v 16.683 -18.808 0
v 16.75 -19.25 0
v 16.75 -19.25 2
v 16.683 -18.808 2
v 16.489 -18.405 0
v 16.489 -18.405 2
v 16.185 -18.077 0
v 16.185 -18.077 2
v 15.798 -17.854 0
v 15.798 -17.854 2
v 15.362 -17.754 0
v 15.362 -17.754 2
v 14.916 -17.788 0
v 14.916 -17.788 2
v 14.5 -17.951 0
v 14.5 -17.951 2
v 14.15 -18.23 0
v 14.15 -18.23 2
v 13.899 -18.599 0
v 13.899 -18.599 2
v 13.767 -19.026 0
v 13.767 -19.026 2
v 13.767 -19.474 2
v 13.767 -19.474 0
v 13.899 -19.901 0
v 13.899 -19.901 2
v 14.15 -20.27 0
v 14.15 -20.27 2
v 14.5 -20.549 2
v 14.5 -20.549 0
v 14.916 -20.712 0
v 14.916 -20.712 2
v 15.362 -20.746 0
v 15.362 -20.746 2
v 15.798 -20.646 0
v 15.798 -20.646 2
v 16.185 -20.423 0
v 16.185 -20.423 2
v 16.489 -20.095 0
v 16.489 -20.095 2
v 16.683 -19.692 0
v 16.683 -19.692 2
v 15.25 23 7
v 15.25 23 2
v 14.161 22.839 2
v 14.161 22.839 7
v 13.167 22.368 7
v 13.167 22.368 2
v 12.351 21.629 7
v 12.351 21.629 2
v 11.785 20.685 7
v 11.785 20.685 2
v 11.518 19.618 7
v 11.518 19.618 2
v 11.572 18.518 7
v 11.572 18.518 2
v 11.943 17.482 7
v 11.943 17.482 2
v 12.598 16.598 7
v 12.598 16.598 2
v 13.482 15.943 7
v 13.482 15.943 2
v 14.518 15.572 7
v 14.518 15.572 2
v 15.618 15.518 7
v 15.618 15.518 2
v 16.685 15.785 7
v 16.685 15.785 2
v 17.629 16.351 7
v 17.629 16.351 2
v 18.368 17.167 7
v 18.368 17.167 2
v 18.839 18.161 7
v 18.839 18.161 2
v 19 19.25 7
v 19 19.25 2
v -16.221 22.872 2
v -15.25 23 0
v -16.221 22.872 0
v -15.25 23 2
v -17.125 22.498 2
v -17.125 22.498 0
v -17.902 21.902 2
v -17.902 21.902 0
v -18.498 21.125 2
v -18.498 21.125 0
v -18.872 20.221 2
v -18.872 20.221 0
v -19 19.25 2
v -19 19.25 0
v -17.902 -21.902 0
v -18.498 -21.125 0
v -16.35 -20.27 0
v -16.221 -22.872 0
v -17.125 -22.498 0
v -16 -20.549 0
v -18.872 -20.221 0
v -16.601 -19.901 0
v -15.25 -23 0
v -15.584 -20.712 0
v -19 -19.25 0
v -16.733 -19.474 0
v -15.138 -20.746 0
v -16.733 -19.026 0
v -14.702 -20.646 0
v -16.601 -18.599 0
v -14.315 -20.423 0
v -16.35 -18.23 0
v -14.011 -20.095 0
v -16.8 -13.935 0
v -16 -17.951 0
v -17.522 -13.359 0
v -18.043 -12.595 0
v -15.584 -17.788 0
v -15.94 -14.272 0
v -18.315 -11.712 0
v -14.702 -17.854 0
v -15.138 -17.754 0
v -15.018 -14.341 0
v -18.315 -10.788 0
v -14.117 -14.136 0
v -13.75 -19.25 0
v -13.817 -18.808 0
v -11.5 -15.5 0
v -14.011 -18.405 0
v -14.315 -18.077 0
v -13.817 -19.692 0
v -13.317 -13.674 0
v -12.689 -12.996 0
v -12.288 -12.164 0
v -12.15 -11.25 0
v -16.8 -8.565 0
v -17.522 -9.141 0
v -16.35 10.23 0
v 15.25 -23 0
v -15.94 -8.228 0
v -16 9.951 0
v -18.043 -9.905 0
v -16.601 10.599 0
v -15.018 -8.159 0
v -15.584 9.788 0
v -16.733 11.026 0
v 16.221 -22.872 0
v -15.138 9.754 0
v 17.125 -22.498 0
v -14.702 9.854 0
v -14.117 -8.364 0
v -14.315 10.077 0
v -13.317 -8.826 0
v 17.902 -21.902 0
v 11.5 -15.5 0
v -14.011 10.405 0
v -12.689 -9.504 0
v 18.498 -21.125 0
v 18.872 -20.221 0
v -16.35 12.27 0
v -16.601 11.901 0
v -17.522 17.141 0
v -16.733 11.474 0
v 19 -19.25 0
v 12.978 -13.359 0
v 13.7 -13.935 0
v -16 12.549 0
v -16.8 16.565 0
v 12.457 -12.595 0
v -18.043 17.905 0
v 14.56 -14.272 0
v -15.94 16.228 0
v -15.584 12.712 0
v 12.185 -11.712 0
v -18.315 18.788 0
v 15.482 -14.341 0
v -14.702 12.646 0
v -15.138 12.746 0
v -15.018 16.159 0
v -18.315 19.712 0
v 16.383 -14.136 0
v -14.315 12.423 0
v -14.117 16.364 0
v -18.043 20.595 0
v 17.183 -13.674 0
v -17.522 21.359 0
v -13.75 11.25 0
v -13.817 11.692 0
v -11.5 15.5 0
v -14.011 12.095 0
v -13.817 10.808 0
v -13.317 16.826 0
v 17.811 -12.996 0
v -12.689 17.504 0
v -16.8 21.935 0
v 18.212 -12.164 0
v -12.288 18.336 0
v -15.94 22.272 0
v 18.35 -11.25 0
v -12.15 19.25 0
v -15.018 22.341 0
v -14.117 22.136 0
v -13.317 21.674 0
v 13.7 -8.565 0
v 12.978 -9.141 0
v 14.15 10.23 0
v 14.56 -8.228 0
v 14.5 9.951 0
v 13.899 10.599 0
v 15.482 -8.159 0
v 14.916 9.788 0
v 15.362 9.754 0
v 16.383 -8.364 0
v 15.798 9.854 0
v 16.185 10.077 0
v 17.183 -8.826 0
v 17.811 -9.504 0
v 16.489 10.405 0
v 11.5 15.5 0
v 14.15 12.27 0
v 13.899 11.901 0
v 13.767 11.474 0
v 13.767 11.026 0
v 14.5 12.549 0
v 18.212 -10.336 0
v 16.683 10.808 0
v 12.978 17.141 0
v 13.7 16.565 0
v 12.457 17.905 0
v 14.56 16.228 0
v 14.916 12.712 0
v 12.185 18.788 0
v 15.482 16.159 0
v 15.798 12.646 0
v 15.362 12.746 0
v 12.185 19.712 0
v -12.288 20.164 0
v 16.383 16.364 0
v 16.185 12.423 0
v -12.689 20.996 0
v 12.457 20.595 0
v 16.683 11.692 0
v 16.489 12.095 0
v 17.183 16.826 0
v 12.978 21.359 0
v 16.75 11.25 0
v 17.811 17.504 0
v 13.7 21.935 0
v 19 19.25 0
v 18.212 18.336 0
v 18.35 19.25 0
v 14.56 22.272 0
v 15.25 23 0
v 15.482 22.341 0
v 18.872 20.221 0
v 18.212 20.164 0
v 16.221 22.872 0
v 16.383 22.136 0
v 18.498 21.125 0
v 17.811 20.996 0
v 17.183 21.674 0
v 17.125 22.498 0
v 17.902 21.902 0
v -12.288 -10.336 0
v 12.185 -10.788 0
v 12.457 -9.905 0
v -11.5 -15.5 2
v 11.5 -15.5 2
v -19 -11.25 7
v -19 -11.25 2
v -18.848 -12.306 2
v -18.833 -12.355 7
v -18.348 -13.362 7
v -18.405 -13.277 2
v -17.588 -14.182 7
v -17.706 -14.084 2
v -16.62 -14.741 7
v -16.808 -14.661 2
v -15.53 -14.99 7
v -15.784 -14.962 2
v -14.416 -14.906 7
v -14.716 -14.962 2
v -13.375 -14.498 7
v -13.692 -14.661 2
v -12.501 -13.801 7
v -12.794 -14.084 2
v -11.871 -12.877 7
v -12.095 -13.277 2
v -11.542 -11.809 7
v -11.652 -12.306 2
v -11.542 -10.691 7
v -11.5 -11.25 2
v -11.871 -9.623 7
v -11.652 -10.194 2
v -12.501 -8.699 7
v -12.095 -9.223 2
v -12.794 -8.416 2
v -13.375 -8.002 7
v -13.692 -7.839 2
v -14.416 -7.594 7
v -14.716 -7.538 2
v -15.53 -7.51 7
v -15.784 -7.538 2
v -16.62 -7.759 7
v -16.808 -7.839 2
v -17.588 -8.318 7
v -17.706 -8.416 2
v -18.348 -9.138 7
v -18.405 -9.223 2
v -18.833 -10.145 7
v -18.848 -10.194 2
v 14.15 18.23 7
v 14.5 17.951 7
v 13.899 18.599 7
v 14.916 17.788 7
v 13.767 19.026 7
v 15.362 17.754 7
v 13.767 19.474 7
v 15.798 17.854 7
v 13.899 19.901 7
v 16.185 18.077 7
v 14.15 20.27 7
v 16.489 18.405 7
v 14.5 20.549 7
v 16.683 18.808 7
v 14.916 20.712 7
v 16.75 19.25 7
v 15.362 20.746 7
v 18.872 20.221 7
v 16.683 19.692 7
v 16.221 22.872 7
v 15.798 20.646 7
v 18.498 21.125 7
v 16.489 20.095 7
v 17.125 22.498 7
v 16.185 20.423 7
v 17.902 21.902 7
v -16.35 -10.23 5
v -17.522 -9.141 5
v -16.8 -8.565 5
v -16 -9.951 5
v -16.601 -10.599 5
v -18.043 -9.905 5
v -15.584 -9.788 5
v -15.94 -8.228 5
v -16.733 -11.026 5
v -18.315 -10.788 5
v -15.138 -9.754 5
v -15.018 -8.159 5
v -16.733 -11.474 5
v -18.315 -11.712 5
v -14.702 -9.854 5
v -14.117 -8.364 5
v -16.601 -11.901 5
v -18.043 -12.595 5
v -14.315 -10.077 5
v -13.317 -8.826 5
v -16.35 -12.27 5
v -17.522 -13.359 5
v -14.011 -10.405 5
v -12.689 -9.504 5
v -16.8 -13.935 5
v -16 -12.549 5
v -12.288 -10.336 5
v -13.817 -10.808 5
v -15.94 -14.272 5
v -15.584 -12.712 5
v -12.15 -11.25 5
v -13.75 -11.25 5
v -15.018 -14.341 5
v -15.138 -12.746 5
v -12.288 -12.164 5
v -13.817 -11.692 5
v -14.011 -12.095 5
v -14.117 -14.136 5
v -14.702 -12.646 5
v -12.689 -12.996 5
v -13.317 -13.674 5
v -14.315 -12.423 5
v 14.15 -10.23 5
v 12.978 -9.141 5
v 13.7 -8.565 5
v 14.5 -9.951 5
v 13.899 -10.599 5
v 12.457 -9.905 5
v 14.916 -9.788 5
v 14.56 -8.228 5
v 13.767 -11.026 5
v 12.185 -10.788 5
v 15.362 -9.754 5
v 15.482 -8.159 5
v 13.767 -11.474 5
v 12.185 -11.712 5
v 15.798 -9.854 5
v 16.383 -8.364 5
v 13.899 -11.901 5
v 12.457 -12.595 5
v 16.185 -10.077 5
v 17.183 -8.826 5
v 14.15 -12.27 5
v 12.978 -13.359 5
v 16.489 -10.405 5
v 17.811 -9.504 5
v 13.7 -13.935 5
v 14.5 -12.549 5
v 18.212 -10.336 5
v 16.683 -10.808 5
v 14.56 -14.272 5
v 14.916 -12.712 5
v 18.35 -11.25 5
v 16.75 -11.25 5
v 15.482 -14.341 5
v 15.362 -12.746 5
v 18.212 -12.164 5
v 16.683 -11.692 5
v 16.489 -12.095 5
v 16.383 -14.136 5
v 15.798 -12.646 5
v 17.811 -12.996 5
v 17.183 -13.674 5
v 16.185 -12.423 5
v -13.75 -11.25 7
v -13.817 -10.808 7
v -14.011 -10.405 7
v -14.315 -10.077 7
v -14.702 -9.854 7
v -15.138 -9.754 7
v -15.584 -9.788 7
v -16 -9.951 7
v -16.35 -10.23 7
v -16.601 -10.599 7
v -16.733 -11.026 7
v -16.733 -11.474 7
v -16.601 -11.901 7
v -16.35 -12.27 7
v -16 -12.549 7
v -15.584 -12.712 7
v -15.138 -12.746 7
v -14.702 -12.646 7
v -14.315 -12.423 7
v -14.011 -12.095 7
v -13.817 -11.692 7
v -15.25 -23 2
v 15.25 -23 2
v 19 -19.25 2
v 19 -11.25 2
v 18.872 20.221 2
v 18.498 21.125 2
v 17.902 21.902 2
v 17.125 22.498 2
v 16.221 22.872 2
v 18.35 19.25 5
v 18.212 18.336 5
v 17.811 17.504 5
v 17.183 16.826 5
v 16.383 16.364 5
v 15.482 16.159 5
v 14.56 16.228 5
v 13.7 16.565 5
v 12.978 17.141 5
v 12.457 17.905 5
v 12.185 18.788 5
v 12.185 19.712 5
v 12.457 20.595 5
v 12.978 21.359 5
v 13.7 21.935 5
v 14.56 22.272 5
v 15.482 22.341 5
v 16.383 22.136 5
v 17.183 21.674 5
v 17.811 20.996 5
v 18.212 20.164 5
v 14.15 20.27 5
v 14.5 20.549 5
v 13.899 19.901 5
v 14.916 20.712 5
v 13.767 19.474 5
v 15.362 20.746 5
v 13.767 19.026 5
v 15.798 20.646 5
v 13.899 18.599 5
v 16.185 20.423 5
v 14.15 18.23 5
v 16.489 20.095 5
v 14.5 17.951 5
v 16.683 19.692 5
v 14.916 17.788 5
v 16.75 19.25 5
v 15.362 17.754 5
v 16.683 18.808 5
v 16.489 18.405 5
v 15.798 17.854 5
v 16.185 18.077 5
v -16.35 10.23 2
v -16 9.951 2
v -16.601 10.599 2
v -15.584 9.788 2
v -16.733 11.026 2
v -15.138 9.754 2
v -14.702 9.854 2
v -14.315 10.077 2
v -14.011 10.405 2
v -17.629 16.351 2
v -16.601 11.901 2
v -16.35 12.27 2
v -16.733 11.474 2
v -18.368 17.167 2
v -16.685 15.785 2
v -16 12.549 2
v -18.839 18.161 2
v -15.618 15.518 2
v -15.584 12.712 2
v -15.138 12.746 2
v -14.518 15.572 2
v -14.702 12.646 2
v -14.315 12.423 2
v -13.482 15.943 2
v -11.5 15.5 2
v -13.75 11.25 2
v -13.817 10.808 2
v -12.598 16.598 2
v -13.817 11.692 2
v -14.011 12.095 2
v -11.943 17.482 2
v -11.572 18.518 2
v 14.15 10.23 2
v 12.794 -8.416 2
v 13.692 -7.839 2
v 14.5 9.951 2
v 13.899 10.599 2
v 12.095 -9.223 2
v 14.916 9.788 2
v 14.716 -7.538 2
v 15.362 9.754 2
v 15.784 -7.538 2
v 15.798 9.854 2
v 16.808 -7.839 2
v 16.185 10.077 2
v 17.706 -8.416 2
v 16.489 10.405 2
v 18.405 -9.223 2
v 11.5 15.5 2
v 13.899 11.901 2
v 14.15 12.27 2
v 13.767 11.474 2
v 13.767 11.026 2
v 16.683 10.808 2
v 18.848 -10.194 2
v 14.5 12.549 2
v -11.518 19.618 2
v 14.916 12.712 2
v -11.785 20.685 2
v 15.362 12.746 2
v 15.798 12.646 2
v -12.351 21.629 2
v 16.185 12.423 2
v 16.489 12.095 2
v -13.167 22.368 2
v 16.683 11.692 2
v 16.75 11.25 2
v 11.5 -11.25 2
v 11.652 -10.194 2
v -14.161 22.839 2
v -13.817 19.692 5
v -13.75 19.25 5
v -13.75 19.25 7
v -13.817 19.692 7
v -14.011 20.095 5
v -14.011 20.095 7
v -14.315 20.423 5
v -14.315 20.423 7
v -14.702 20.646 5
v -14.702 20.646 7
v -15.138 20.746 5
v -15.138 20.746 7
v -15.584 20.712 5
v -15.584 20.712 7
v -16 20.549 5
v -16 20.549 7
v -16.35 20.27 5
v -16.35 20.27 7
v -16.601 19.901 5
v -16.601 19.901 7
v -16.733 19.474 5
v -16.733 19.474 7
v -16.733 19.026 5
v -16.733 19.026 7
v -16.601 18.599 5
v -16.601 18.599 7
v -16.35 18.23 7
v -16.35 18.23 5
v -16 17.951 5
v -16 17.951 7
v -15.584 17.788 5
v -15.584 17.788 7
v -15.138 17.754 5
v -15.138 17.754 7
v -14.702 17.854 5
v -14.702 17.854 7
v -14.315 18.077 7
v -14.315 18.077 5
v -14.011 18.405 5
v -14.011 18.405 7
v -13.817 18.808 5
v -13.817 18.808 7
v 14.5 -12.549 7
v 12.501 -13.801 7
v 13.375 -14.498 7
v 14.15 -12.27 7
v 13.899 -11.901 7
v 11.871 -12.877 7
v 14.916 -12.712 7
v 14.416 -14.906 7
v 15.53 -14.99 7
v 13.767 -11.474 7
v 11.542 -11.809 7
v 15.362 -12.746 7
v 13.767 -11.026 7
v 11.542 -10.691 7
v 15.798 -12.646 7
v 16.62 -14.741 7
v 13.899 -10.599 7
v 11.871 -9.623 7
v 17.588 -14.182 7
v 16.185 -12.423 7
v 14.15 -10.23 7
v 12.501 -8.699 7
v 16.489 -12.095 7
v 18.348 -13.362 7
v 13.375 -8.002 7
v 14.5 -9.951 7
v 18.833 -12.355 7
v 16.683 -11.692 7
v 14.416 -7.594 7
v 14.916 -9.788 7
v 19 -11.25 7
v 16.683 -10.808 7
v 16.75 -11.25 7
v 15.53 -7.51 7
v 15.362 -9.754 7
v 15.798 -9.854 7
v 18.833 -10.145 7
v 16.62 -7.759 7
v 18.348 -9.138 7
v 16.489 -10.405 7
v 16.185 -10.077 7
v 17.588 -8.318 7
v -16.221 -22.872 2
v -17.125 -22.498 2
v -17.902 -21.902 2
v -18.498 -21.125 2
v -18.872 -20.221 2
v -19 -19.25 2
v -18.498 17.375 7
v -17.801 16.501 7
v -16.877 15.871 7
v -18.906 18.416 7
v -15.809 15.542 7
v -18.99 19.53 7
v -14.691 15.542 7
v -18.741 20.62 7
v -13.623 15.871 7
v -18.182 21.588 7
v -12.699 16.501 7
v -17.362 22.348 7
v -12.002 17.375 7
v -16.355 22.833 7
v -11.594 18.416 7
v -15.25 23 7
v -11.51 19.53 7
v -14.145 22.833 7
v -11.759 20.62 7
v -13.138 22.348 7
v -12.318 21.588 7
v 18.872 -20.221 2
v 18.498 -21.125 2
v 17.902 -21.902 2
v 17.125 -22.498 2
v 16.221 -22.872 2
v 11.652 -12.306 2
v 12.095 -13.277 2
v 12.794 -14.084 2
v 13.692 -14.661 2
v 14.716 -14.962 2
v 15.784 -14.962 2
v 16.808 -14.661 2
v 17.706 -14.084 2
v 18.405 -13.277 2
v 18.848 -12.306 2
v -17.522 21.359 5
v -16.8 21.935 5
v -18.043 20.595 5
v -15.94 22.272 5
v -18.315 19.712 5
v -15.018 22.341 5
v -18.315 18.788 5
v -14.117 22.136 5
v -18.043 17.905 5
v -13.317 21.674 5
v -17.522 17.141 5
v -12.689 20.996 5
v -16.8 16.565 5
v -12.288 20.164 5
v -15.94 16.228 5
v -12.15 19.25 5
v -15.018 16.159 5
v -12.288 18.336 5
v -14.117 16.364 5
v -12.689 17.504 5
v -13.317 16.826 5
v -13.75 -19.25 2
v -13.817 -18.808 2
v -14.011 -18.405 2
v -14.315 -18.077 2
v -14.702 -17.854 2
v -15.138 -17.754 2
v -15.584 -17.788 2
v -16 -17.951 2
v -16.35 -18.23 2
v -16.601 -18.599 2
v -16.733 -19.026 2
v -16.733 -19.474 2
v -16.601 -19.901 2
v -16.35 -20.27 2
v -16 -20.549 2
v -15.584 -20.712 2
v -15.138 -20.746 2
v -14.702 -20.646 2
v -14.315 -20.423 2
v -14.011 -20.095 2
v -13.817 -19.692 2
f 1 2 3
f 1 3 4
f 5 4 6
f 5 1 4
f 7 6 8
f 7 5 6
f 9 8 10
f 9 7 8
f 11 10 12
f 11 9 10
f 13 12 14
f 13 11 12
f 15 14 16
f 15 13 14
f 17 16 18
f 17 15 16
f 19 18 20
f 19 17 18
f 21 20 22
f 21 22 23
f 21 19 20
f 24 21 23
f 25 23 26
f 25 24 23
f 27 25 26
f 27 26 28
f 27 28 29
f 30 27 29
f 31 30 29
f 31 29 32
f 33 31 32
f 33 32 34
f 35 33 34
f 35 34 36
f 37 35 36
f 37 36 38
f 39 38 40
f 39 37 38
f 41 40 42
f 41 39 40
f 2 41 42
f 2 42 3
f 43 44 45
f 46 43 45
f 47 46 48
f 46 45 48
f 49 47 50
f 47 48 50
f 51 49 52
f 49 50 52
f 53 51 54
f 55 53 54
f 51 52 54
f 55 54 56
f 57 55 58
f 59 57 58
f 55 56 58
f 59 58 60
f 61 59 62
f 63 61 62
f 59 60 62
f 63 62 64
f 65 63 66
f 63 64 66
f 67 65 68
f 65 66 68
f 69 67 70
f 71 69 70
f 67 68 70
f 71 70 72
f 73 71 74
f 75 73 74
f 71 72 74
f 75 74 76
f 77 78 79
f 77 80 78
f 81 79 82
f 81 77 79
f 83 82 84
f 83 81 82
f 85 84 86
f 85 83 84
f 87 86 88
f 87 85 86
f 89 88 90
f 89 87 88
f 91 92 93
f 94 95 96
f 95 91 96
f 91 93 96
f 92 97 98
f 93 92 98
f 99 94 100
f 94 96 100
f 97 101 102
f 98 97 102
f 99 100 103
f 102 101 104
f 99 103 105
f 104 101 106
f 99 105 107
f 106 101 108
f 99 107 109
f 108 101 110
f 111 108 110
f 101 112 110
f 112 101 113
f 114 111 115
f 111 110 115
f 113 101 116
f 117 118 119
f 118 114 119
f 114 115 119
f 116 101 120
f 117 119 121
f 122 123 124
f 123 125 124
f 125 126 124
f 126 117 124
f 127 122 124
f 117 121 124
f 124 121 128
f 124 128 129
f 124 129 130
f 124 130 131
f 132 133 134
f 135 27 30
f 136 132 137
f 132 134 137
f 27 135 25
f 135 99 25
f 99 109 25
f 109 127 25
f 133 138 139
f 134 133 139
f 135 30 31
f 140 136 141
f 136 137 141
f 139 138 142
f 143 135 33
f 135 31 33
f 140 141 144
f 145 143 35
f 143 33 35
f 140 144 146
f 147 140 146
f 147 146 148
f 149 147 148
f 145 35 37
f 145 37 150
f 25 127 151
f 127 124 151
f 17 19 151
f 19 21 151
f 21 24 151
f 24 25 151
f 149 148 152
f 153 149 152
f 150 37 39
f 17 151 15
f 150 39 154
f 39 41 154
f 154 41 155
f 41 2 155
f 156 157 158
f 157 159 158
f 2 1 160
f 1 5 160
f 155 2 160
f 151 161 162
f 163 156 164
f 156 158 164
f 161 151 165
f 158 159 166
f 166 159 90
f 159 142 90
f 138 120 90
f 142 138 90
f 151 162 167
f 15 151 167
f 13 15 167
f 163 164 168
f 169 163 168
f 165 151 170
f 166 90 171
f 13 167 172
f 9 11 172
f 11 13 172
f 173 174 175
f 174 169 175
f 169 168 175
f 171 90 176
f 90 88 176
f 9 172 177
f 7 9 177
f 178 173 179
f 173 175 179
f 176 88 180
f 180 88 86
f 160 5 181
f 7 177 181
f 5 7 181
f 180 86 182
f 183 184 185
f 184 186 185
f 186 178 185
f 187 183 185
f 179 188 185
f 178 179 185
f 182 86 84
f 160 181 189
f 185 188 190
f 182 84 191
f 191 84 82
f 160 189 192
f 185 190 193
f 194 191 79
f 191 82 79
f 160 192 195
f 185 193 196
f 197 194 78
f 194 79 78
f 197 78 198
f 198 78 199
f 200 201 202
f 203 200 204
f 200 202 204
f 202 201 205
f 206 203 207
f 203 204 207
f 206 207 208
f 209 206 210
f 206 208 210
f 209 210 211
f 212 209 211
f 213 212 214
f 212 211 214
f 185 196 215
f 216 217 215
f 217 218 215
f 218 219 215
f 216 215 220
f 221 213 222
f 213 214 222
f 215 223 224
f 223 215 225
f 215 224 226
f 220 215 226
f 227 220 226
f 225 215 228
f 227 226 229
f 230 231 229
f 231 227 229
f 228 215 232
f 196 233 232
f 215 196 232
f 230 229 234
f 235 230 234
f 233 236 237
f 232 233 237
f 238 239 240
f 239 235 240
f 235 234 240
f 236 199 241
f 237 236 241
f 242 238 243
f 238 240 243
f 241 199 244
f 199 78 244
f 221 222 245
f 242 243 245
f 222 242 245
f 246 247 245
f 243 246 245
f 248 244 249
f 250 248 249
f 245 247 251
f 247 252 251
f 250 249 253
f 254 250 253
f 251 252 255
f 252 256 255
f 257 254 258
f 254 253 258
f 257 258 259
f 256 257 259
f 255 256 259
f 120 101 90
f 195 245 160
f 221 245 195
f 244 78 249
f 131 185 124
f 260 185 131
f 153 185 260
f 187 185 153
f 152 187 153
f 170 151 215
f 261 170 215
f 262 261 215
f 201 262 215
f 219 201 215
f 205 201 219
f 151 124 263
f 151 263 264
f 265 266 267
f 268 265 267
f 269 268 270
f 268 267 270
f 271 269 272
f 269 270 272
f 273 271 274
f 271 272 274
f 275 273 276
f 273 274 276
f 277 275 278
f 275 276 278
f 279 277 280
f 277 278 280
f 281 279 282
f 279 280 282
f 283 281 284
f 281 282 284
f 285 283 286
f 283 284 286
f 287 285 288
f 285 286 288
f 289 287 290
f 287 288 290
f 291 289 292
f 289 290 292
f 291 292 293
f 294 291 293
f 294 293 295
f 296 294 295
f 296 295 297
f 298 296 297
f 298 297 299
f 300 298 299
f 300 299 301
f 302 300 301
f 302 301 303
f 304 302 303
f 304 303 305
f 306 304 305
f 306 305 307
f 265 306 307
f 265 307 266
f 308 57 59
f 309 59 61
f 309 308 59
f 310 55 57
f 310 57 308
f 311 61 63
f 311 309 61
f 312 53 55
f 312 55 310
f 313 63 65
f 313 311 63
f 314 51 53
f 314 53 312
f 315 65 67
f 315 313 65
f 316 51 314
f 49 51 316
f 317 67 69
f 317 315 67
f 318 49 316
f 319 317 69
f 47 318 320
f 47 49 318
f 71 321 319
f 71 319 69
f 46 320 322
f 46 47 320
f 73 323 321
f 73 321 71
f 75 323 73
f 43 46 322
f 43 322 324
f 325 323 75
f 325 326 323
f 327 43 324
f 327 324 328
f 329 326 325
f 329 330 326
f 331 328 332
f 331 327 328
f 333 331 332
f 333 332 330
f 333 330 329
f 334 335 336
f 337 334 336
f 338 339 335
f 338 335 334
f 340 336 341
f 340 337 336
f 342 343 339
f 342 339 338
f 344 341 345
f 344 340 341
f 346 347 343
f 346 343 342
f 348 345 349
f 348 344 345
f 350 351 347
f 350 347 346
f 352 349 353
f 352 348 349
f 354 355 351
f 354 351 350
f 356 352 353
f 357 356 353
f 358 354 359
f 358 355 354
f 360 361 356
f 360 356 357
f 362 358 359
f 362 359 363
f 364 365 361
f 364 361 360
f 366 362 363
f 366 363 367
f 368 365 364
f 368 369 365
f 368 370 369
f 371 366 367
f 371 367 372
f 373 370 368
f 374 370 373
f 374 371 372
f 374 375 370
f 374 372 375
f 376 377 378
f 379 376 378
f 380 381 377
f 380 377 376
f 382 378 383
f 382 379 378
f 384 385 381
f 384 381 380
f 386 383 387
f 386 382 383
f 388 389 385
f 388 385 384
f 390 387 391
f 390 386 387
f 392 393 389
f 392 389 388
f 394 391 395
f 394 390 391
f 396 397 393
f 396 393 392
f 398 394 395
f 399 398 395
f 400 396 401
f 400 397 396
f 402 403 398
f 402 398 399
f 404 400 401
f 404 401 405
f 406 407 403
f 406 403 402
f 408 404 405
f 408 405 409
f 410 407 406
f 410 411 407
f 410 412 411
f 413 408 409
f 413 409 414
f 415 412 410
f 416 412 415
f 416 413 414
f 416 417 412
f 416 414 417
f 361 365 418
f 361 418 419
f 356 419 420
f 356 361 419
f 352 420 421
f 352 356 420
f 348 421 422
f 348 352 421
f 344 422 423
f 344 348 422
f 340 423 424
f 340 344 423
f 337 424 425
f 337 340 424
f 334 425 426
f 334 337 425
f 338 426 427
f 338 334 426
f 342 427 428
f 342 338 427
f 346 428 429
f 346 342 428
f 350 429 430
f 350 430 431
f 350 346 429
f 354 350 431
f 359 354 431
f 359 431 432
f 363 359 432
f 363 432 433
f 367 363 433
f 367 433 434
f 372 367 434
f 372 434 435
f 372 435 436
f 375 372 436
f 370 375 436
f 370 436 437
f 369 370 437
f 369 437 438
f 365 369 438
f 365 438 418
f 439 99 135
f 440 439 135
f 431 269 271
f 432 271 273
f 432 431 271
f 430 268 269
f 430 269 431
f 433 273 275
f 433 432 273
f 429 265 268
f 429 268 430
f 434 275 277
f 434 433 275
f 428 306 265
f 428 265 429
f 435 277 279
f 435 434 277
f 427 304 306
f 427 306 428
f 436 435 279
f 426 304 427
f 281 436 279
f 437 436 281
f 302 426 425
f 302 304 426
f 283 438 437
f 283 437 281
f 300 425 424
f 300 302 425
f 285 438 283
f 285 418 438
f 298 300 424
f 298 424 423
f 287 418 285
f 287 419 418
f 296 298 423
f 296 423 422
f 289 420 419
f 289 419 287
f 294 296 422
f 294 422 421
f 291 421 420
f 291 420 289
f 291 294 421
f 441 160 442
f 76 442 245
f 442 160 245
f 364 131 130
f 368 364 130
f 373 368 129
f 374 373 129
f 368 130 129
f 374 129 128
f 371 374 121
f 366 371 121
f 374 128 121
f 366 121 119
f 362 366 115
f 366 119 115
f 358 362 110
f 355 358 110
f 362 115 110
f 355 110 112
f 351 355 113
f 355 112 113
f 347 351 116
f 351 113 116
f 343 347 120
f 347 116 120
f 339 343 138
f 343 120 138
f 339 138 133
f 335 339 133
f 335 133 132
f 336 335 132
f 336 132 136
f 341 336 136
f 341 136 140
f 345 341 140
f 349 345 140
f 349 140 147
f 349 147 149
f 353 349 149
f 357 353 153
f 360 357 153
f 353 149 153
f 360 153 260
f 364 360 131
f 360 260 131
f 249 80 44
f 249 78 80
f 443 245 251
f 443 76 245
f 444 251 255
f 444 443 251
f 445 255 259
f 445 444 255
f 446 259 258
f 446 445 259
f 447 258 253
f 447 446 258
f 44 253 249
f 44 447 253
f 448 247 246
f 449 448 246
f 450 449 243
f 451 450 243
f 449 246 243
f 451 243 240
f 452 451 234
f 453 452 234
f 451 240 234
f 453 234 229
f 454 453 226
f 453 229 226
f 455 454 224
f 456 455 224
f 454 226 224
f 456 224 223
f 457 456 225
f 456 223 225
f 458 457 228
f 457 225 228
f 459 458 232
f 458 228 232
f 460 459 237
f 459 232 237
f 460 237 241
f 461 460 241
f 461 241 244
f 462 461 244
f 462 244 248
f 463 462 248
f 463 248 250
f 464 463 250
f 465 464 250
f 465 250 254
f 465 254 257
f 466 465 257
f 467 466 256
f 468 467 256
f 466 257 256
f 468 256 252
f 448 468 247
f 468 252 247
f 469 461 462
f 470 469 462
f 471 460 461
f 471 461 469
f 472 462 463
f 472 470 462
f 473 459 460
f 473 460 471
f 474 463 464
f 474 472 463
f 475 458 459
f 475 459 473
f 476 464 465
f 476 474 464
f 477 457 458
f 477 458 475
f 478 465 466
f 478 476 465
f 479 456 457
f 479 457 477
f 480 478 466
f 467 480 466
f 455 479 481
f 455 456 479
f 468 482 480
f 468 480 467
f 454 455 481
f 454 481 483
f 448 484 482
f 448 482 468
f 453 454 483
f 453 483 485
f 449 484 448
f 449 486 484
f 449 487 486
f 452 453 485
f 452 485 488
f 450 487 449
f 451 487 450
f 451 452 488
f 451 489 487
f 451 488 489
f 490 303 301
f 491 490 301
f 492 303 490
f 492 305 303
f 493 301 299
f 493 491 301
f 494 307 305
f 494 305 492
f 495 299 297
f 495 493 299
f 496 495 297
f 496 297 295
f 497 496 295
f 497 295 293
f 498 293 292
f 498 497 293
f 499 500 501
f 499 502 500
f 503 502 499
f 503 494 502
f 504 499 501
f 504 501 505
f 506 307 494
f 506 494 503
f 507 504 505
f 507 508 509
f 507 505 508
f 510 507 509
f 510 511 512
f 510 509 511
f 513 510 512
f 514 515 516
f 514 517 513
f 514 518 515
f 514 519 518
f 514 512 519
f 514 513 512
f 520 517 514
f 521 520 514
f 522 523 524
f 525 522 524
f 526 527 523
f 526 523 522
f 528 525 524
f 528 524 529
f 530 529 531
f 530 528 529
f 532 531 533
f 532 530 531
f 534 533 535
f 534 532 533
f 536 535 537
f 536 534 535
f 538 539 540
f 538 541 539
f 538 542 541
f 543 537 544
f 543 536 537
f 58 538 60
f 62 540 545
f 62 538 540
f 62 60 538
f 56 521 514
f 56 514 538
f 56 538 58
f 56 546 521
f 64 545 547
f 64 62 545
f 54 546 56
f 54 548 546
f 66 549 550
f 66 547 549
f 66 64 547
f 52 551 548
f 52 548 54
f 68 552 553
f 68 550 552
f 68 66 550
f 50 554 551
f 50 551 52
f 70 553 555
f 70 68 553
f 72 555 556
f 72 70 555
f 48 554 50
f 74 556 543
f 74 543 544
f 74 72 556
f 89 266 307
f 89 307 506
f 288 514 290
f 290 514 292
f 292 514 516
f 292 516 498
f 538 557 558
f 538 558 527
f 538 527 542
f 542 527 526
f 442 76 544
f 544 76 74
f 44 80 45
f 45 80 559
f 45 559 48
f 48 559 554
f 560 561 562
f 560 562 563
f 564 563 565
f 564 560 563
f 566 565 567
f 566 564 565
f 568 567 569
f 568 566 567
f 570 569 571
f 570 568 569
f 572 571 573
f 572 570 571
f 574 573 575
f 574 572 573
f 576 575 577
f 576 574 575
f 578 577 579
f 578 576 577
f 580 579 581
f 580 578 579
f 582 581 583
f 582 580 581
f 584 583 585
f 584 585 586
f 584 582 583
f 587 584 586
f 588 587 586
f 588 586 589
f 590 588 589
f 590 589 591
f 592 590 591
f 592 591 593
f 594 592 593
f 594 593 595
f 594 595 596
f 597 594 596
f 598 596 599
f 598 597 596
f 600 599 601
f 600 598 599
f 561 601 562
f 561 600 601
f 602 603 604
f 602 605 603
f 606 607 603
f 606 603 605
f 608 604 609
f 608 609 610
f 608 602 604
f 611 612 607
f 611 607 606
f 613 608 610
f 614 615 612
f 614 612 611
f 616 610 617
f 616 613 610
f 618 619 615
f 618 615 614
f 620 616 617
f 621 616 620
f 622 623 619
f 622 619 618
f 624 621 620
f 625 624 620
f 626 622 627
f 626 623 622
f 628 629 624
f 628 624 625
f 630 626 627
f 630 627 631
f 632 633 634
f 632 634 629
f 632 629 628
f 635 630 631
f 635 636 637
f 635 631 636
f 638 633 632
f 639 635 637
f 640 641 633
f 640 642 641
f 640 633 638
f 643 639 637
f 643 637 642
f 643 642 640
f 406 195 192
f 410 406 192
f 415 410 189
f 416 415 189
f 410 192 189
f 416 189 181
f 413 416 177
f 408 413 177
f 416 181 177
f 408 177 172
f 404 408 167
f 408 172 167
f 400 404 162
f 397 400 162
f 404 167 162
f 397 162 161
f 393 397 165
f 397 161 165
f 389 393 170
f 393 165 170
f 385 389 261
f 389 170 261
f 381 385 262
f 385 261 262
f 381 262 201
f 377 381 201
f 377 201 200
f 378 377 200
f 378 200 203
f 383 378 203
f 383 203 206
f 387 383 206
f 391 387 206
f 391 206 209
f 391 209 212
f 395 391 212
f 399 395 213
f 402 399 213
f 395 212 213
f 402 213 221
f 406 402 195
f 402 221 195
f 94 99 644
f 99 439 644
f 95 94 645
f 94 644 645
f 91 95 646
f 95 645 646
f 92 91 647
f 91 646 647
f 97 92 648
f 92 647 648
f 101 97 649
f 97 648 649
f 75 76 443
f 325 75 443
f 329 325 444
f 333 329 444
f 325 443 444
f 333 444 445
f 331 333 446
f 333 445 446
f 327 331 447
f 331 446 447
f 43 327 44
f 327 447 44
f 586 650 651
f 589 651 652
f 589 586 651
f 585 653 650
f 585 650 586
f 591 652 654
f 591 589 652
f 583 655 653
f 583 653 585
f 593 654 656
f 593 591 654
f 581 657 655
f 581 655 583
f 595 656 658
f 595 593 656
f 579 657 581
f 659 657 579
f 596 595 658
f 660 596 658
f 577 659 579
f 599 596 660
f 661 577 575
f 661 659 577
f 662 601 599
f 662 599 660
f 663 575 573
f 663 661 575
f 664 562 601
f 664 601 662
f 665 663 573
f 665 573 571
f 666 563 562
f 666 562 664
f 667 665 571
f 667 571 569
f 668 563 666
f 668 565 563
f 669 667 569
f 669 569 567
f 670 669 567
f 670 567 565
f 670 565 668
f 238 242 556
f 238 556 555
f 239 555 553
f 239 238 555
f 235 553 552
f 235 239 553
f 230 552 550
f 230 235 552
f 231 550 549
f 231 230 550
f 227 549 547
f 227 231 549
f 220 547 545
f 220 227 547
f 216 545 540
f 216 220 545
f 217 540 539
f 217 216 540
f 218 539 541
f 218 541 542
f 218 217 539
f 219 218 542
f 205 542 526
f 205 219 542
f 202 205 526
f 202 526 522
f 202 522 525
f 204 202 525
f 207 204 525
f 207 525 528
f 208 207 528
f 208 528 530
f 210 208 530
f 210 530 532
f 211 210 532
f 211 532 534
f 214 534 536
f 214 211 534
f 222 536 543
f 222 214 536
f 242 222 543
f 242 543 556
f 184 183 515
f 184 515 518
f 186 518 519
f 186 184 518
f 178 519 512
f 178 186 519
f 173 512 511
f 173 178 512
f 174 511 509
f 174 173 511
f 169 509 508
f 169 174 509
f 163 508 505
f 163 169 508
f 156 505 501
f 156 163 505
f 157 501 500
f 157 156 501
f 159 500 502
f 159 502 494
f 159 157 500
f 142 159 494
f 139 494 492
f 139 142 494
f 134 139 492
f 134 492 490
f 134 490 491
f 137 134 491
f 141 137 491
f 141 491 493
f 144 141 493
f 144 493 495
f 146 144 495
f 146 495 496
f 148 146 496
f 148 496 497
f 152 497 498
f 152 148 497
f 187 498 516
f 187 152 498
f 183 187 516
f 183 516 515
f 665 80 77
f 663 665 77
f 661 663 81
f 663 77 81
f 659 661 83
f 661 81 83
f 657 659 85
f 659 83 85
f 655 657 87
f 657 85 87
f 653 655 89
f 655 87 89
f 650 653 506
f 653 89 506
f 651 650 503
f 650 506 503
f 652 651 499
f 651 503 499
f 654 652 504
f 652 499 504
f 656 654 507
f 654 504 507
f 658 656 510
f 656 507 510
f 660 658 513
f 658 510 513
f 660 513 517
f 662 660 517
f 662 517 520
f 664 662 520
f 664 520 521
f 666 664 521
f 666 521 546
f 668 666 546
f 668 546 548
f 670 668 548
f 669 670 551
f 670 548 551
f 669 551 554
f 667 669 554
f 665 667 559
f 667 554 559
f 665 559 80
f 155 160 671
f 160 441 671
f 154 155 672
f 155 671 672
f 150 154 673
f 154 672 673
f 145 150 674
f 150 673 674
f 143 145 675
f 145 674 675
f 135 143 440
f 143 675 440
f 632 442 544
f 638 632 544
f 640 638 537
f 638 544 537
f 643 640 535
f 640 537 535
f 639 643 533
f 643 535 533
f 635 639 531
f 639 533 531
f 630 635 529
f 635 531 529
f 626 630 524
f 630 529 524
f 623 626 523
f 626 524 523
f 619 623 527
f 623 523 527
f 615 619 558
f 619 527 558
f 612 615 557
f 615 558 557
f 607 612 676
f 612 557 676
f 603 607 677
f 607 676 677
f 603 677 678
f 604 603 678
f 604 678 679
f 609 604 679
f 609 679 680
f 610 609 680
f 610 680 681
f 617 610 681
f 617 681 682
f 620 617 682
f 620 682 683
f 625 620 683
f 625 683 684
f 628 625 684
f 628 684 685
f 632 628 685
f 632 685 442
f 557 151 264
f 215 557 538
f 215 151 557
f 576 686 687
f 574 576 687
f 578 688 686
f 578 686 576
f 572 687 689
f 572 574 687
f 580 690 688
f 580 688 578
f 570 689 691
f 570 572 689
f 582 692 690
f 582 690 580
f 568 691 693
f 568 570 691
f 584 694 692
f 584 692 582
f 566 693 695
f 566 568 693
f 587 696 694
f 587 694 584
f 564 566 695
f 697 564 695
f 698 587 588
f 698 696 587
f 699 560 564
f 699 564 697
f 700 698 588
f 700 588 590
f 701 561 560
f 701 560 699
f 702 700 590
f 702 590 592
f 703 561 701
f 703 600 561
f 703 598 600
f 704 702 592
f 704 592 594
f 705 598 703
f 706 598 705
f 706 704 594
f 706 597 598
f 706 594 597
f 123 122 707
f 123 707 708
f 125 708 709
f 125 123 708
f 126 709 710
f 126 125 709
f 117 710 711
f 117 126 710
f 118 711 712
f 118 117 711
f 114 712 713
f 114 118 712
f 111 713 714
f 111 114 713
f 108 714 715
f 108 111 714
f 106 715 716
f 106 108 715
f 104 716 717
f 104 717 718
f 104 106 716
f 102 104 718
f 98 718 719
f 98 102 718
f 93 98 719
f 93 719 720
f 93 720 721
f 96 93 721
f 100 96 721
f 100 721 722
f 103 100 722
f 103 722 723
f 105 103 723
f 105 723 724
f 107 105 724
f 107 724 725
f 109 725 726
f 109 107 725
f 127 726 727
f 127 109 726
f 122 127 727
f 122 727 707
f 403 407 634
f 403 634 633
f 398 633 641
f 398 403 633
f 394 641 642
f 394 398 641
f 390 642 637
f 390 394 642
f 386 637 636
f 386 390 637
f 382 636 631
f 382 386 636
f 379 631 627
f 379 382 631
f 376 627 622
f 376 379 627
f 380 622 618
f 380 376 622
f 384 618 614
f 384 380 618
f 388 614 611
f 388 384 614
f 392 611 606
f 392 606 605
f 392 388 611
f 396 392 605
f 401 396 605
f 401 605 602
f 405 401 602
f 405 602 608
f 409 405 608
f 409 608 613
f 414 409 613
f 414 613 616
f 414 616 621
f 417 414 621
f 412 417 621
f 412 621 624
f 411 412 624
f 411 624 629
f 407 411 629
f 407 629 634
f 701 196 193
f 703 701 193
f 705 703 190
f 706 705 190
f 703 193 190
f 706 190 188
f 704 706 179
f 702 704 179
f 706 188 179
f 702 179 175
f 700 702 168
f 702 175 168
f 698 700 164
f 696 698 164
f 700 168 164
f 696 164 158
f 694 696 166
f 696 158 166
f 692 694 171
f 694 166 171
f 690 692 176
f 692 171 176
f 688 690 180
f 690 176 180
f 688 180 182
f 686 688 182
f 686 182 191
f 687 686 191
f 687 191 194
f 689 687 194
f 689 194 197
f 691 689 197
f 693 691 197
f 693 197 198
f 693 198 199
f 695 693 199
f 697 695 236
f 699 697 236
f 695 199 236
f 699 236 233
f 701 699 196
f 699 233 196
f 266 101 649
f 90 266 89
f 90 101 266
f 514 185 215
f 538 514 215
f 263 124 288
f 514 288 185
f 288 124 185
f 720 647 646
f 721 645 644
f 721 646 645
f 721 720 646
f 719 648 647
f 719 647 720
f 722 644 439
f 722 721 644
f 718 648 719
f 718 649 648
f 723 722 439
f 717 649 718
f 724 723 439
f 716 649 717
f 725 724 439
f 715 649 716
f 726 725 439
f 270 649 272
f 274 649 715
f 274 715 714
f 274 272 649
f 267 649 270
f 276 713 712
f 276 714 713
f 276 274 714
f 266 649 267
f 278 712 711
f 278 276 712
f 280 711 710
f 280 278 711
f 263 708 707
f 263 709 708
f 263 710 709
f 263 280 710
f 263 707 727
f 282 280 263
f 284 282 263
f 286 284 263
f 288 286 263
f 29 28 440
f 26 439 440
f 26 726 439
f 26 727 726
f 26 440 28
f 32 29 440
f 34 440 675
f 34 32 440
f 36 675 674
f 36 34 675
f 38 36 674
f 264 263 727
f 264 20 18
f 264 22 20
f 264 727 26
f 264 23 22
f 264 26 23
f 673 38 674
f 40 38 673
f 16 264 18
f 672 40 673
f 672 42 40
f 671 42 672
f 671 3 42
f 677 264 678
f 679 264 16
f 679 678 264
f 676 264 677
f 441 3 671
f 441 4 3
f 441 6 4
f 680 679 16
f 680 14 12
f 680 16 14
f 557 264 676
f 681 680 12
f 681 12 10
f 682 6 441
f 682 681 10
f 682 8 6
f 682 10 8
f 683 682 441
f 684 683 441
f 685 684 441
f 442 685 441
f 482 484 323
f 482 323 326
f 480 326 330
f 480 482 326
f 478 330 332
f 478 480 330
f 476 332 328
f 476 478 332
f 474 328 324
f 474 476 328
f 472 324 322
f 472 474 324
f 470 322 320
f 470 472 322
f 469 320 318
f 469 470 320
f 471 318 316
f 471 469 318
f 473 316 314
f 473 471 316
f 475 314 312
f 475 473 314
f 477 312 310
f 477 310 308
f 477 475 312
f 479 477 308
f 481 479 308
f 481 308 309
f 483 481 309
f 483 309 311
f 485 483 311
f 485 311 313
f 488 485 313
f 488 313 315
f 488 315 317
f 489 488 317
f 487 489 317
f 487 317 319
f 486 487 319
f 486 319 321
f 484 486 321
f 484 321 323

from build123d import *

# Parameters (mm, degrees)
F3_W     = 38
F3_H     = 46
F3_R     = 1.5
F3_W_2   = 23
F3_H_2   = 31
F4_DEPTH = 2
F5_R     = 1.5
F6_DEPTH = 5
F7_R     = 3.7499
F8_R     = 3.1
F9_DEPTH = 5


# Not quite as in the source:
# - a fillet or chamfer is up to 0.001 mm smaller than in the source, because OpenCascade refuses the exact size


with BuildPart() as f4:
    # F3 (on Top) → F4 (new body)
    with BuildSketch(Plane.XY):
        Rectangle(F3_W, F3_H)
        with Locations((-15.25, -19.25)):
            Circle(F3_R, mode=Mode.SUBTRACT)
        with Locations((-15.25, -11.25)):
            Circle(F3_R, mode=Mode.SUBTRACT)
        with Locations((15.25, -19.25)):
            Circle(F3_R, mode=Mode.SUBTRACT)
        with Locations((15.25, -11.25)):
            Circle(F3_R, mode=Mode.SUBTRACT)
        with Locations((-15.25, 11.25)):
            Circle(F3_R, mode=Mode.SUBTRACT)
        with Locations((-15.25, 19.25)):
            Circle(F3_R, mode=Mode.SUBTRACT)
        Rectangle(F3_W_2, F3_H_2, mode=Mode.SUBTRACT)
        with Locations((15.25, 11.25)):
            Circle(F3_R, mode=Mode.SUBTRACT)
        with Locations((15.25, 19.25)):
            Circle(F3_R, mode=Mode.SUBTRACT)
    extrude(amount=F4_DEPTH)

    # F5 (on face) → F6 (join)
    with BuildSketch(Plane.XY.offset(2)):
        with BuildLine():
            ThreePointArc((-19, 19.25), (-15.25, 15.5), (-11.5, 19.25))
            ThreePointArc((-11.5, 19.25), (-12.598349559, 21.9016504179), (-15.2499999673, 23))
            ThreePointArc((-15.2499999673, 23), (-17.9016504179, 21.901650441), (-19, 19.25))
        make_face()
        with Locations((-15.25, 19.25)):
            Circle(F5_R, mode=Mode.SUBTRACT)
        with BuildLine():
            ThreePointArc((19, 19.25), (17.9016504294, 21.9016504294), (15.25, 23))
            ThreePointArc((15.25, 23), (12.5983495706, 16.5983495706), (19, 19.25))
        make_face()
        with Locations((15.25, 19.25)):
            Circle(F5_R, mode=Mode.SUBTRACT)
        with BuildLine():
            ThreePointArc((11.5, -11.25), (15.25, -15), (19, -11.25))
            ThreePointArc((19, -11.25), (15.25, -7.5), (11.5, -11.25))
        make_face()
        with Locations((15.25, -11.25)):
            Circle(F5_R, mode=Mode.SUBTRACT)
        with BuildLine():
            ThreePointArc((-11.5, -11.25), (-15.2499999923, -7.5), (-19, -11.2499999846))
            ThreePointArc((-19, -11.2499999846), (-15.2500000077, -15), (-11.5, -11.25))
        make_face()
        with Locations((-15.25, -11.25)):
            Circle(F5_R, mode=Mode.SUBTRACT)
    extrude(amount=F6_DEPTH)

    # F7 (radius 3.75 in the source; OpenCascade refuses exactly that, so slightly less here)
    f7_edges = [f4.edges().sort_by_distance(p)[0] for p in [
        (-19, 23, 1),
        (-19, -23, 1),
        (19, -23, 1),
        (19, 23, 1),
    ]]
    fillet(f7_edges, radius=F7_R)

    # F8 (on face) → F9 (cut)
    with BuildSketch(Plane(origin=(0, 0, 0), x_dir=(1, 0, 0), z_dir=(0, 0, -1))):
        with Locations((-15.25, 11.25)):
            Circle(F8_R)
        with Locations((15.25, 11.25)):
            Circle(F8_R)
        with Locations((15.25, -19.25)):
            Circle(F8_R)
        with Locations((-15.25, -19.25)):
            Circle(F8_R)
    extrude(amount=-F9_DEPTH, mode=Mode.SUBTRACT)


solid = f4.part
